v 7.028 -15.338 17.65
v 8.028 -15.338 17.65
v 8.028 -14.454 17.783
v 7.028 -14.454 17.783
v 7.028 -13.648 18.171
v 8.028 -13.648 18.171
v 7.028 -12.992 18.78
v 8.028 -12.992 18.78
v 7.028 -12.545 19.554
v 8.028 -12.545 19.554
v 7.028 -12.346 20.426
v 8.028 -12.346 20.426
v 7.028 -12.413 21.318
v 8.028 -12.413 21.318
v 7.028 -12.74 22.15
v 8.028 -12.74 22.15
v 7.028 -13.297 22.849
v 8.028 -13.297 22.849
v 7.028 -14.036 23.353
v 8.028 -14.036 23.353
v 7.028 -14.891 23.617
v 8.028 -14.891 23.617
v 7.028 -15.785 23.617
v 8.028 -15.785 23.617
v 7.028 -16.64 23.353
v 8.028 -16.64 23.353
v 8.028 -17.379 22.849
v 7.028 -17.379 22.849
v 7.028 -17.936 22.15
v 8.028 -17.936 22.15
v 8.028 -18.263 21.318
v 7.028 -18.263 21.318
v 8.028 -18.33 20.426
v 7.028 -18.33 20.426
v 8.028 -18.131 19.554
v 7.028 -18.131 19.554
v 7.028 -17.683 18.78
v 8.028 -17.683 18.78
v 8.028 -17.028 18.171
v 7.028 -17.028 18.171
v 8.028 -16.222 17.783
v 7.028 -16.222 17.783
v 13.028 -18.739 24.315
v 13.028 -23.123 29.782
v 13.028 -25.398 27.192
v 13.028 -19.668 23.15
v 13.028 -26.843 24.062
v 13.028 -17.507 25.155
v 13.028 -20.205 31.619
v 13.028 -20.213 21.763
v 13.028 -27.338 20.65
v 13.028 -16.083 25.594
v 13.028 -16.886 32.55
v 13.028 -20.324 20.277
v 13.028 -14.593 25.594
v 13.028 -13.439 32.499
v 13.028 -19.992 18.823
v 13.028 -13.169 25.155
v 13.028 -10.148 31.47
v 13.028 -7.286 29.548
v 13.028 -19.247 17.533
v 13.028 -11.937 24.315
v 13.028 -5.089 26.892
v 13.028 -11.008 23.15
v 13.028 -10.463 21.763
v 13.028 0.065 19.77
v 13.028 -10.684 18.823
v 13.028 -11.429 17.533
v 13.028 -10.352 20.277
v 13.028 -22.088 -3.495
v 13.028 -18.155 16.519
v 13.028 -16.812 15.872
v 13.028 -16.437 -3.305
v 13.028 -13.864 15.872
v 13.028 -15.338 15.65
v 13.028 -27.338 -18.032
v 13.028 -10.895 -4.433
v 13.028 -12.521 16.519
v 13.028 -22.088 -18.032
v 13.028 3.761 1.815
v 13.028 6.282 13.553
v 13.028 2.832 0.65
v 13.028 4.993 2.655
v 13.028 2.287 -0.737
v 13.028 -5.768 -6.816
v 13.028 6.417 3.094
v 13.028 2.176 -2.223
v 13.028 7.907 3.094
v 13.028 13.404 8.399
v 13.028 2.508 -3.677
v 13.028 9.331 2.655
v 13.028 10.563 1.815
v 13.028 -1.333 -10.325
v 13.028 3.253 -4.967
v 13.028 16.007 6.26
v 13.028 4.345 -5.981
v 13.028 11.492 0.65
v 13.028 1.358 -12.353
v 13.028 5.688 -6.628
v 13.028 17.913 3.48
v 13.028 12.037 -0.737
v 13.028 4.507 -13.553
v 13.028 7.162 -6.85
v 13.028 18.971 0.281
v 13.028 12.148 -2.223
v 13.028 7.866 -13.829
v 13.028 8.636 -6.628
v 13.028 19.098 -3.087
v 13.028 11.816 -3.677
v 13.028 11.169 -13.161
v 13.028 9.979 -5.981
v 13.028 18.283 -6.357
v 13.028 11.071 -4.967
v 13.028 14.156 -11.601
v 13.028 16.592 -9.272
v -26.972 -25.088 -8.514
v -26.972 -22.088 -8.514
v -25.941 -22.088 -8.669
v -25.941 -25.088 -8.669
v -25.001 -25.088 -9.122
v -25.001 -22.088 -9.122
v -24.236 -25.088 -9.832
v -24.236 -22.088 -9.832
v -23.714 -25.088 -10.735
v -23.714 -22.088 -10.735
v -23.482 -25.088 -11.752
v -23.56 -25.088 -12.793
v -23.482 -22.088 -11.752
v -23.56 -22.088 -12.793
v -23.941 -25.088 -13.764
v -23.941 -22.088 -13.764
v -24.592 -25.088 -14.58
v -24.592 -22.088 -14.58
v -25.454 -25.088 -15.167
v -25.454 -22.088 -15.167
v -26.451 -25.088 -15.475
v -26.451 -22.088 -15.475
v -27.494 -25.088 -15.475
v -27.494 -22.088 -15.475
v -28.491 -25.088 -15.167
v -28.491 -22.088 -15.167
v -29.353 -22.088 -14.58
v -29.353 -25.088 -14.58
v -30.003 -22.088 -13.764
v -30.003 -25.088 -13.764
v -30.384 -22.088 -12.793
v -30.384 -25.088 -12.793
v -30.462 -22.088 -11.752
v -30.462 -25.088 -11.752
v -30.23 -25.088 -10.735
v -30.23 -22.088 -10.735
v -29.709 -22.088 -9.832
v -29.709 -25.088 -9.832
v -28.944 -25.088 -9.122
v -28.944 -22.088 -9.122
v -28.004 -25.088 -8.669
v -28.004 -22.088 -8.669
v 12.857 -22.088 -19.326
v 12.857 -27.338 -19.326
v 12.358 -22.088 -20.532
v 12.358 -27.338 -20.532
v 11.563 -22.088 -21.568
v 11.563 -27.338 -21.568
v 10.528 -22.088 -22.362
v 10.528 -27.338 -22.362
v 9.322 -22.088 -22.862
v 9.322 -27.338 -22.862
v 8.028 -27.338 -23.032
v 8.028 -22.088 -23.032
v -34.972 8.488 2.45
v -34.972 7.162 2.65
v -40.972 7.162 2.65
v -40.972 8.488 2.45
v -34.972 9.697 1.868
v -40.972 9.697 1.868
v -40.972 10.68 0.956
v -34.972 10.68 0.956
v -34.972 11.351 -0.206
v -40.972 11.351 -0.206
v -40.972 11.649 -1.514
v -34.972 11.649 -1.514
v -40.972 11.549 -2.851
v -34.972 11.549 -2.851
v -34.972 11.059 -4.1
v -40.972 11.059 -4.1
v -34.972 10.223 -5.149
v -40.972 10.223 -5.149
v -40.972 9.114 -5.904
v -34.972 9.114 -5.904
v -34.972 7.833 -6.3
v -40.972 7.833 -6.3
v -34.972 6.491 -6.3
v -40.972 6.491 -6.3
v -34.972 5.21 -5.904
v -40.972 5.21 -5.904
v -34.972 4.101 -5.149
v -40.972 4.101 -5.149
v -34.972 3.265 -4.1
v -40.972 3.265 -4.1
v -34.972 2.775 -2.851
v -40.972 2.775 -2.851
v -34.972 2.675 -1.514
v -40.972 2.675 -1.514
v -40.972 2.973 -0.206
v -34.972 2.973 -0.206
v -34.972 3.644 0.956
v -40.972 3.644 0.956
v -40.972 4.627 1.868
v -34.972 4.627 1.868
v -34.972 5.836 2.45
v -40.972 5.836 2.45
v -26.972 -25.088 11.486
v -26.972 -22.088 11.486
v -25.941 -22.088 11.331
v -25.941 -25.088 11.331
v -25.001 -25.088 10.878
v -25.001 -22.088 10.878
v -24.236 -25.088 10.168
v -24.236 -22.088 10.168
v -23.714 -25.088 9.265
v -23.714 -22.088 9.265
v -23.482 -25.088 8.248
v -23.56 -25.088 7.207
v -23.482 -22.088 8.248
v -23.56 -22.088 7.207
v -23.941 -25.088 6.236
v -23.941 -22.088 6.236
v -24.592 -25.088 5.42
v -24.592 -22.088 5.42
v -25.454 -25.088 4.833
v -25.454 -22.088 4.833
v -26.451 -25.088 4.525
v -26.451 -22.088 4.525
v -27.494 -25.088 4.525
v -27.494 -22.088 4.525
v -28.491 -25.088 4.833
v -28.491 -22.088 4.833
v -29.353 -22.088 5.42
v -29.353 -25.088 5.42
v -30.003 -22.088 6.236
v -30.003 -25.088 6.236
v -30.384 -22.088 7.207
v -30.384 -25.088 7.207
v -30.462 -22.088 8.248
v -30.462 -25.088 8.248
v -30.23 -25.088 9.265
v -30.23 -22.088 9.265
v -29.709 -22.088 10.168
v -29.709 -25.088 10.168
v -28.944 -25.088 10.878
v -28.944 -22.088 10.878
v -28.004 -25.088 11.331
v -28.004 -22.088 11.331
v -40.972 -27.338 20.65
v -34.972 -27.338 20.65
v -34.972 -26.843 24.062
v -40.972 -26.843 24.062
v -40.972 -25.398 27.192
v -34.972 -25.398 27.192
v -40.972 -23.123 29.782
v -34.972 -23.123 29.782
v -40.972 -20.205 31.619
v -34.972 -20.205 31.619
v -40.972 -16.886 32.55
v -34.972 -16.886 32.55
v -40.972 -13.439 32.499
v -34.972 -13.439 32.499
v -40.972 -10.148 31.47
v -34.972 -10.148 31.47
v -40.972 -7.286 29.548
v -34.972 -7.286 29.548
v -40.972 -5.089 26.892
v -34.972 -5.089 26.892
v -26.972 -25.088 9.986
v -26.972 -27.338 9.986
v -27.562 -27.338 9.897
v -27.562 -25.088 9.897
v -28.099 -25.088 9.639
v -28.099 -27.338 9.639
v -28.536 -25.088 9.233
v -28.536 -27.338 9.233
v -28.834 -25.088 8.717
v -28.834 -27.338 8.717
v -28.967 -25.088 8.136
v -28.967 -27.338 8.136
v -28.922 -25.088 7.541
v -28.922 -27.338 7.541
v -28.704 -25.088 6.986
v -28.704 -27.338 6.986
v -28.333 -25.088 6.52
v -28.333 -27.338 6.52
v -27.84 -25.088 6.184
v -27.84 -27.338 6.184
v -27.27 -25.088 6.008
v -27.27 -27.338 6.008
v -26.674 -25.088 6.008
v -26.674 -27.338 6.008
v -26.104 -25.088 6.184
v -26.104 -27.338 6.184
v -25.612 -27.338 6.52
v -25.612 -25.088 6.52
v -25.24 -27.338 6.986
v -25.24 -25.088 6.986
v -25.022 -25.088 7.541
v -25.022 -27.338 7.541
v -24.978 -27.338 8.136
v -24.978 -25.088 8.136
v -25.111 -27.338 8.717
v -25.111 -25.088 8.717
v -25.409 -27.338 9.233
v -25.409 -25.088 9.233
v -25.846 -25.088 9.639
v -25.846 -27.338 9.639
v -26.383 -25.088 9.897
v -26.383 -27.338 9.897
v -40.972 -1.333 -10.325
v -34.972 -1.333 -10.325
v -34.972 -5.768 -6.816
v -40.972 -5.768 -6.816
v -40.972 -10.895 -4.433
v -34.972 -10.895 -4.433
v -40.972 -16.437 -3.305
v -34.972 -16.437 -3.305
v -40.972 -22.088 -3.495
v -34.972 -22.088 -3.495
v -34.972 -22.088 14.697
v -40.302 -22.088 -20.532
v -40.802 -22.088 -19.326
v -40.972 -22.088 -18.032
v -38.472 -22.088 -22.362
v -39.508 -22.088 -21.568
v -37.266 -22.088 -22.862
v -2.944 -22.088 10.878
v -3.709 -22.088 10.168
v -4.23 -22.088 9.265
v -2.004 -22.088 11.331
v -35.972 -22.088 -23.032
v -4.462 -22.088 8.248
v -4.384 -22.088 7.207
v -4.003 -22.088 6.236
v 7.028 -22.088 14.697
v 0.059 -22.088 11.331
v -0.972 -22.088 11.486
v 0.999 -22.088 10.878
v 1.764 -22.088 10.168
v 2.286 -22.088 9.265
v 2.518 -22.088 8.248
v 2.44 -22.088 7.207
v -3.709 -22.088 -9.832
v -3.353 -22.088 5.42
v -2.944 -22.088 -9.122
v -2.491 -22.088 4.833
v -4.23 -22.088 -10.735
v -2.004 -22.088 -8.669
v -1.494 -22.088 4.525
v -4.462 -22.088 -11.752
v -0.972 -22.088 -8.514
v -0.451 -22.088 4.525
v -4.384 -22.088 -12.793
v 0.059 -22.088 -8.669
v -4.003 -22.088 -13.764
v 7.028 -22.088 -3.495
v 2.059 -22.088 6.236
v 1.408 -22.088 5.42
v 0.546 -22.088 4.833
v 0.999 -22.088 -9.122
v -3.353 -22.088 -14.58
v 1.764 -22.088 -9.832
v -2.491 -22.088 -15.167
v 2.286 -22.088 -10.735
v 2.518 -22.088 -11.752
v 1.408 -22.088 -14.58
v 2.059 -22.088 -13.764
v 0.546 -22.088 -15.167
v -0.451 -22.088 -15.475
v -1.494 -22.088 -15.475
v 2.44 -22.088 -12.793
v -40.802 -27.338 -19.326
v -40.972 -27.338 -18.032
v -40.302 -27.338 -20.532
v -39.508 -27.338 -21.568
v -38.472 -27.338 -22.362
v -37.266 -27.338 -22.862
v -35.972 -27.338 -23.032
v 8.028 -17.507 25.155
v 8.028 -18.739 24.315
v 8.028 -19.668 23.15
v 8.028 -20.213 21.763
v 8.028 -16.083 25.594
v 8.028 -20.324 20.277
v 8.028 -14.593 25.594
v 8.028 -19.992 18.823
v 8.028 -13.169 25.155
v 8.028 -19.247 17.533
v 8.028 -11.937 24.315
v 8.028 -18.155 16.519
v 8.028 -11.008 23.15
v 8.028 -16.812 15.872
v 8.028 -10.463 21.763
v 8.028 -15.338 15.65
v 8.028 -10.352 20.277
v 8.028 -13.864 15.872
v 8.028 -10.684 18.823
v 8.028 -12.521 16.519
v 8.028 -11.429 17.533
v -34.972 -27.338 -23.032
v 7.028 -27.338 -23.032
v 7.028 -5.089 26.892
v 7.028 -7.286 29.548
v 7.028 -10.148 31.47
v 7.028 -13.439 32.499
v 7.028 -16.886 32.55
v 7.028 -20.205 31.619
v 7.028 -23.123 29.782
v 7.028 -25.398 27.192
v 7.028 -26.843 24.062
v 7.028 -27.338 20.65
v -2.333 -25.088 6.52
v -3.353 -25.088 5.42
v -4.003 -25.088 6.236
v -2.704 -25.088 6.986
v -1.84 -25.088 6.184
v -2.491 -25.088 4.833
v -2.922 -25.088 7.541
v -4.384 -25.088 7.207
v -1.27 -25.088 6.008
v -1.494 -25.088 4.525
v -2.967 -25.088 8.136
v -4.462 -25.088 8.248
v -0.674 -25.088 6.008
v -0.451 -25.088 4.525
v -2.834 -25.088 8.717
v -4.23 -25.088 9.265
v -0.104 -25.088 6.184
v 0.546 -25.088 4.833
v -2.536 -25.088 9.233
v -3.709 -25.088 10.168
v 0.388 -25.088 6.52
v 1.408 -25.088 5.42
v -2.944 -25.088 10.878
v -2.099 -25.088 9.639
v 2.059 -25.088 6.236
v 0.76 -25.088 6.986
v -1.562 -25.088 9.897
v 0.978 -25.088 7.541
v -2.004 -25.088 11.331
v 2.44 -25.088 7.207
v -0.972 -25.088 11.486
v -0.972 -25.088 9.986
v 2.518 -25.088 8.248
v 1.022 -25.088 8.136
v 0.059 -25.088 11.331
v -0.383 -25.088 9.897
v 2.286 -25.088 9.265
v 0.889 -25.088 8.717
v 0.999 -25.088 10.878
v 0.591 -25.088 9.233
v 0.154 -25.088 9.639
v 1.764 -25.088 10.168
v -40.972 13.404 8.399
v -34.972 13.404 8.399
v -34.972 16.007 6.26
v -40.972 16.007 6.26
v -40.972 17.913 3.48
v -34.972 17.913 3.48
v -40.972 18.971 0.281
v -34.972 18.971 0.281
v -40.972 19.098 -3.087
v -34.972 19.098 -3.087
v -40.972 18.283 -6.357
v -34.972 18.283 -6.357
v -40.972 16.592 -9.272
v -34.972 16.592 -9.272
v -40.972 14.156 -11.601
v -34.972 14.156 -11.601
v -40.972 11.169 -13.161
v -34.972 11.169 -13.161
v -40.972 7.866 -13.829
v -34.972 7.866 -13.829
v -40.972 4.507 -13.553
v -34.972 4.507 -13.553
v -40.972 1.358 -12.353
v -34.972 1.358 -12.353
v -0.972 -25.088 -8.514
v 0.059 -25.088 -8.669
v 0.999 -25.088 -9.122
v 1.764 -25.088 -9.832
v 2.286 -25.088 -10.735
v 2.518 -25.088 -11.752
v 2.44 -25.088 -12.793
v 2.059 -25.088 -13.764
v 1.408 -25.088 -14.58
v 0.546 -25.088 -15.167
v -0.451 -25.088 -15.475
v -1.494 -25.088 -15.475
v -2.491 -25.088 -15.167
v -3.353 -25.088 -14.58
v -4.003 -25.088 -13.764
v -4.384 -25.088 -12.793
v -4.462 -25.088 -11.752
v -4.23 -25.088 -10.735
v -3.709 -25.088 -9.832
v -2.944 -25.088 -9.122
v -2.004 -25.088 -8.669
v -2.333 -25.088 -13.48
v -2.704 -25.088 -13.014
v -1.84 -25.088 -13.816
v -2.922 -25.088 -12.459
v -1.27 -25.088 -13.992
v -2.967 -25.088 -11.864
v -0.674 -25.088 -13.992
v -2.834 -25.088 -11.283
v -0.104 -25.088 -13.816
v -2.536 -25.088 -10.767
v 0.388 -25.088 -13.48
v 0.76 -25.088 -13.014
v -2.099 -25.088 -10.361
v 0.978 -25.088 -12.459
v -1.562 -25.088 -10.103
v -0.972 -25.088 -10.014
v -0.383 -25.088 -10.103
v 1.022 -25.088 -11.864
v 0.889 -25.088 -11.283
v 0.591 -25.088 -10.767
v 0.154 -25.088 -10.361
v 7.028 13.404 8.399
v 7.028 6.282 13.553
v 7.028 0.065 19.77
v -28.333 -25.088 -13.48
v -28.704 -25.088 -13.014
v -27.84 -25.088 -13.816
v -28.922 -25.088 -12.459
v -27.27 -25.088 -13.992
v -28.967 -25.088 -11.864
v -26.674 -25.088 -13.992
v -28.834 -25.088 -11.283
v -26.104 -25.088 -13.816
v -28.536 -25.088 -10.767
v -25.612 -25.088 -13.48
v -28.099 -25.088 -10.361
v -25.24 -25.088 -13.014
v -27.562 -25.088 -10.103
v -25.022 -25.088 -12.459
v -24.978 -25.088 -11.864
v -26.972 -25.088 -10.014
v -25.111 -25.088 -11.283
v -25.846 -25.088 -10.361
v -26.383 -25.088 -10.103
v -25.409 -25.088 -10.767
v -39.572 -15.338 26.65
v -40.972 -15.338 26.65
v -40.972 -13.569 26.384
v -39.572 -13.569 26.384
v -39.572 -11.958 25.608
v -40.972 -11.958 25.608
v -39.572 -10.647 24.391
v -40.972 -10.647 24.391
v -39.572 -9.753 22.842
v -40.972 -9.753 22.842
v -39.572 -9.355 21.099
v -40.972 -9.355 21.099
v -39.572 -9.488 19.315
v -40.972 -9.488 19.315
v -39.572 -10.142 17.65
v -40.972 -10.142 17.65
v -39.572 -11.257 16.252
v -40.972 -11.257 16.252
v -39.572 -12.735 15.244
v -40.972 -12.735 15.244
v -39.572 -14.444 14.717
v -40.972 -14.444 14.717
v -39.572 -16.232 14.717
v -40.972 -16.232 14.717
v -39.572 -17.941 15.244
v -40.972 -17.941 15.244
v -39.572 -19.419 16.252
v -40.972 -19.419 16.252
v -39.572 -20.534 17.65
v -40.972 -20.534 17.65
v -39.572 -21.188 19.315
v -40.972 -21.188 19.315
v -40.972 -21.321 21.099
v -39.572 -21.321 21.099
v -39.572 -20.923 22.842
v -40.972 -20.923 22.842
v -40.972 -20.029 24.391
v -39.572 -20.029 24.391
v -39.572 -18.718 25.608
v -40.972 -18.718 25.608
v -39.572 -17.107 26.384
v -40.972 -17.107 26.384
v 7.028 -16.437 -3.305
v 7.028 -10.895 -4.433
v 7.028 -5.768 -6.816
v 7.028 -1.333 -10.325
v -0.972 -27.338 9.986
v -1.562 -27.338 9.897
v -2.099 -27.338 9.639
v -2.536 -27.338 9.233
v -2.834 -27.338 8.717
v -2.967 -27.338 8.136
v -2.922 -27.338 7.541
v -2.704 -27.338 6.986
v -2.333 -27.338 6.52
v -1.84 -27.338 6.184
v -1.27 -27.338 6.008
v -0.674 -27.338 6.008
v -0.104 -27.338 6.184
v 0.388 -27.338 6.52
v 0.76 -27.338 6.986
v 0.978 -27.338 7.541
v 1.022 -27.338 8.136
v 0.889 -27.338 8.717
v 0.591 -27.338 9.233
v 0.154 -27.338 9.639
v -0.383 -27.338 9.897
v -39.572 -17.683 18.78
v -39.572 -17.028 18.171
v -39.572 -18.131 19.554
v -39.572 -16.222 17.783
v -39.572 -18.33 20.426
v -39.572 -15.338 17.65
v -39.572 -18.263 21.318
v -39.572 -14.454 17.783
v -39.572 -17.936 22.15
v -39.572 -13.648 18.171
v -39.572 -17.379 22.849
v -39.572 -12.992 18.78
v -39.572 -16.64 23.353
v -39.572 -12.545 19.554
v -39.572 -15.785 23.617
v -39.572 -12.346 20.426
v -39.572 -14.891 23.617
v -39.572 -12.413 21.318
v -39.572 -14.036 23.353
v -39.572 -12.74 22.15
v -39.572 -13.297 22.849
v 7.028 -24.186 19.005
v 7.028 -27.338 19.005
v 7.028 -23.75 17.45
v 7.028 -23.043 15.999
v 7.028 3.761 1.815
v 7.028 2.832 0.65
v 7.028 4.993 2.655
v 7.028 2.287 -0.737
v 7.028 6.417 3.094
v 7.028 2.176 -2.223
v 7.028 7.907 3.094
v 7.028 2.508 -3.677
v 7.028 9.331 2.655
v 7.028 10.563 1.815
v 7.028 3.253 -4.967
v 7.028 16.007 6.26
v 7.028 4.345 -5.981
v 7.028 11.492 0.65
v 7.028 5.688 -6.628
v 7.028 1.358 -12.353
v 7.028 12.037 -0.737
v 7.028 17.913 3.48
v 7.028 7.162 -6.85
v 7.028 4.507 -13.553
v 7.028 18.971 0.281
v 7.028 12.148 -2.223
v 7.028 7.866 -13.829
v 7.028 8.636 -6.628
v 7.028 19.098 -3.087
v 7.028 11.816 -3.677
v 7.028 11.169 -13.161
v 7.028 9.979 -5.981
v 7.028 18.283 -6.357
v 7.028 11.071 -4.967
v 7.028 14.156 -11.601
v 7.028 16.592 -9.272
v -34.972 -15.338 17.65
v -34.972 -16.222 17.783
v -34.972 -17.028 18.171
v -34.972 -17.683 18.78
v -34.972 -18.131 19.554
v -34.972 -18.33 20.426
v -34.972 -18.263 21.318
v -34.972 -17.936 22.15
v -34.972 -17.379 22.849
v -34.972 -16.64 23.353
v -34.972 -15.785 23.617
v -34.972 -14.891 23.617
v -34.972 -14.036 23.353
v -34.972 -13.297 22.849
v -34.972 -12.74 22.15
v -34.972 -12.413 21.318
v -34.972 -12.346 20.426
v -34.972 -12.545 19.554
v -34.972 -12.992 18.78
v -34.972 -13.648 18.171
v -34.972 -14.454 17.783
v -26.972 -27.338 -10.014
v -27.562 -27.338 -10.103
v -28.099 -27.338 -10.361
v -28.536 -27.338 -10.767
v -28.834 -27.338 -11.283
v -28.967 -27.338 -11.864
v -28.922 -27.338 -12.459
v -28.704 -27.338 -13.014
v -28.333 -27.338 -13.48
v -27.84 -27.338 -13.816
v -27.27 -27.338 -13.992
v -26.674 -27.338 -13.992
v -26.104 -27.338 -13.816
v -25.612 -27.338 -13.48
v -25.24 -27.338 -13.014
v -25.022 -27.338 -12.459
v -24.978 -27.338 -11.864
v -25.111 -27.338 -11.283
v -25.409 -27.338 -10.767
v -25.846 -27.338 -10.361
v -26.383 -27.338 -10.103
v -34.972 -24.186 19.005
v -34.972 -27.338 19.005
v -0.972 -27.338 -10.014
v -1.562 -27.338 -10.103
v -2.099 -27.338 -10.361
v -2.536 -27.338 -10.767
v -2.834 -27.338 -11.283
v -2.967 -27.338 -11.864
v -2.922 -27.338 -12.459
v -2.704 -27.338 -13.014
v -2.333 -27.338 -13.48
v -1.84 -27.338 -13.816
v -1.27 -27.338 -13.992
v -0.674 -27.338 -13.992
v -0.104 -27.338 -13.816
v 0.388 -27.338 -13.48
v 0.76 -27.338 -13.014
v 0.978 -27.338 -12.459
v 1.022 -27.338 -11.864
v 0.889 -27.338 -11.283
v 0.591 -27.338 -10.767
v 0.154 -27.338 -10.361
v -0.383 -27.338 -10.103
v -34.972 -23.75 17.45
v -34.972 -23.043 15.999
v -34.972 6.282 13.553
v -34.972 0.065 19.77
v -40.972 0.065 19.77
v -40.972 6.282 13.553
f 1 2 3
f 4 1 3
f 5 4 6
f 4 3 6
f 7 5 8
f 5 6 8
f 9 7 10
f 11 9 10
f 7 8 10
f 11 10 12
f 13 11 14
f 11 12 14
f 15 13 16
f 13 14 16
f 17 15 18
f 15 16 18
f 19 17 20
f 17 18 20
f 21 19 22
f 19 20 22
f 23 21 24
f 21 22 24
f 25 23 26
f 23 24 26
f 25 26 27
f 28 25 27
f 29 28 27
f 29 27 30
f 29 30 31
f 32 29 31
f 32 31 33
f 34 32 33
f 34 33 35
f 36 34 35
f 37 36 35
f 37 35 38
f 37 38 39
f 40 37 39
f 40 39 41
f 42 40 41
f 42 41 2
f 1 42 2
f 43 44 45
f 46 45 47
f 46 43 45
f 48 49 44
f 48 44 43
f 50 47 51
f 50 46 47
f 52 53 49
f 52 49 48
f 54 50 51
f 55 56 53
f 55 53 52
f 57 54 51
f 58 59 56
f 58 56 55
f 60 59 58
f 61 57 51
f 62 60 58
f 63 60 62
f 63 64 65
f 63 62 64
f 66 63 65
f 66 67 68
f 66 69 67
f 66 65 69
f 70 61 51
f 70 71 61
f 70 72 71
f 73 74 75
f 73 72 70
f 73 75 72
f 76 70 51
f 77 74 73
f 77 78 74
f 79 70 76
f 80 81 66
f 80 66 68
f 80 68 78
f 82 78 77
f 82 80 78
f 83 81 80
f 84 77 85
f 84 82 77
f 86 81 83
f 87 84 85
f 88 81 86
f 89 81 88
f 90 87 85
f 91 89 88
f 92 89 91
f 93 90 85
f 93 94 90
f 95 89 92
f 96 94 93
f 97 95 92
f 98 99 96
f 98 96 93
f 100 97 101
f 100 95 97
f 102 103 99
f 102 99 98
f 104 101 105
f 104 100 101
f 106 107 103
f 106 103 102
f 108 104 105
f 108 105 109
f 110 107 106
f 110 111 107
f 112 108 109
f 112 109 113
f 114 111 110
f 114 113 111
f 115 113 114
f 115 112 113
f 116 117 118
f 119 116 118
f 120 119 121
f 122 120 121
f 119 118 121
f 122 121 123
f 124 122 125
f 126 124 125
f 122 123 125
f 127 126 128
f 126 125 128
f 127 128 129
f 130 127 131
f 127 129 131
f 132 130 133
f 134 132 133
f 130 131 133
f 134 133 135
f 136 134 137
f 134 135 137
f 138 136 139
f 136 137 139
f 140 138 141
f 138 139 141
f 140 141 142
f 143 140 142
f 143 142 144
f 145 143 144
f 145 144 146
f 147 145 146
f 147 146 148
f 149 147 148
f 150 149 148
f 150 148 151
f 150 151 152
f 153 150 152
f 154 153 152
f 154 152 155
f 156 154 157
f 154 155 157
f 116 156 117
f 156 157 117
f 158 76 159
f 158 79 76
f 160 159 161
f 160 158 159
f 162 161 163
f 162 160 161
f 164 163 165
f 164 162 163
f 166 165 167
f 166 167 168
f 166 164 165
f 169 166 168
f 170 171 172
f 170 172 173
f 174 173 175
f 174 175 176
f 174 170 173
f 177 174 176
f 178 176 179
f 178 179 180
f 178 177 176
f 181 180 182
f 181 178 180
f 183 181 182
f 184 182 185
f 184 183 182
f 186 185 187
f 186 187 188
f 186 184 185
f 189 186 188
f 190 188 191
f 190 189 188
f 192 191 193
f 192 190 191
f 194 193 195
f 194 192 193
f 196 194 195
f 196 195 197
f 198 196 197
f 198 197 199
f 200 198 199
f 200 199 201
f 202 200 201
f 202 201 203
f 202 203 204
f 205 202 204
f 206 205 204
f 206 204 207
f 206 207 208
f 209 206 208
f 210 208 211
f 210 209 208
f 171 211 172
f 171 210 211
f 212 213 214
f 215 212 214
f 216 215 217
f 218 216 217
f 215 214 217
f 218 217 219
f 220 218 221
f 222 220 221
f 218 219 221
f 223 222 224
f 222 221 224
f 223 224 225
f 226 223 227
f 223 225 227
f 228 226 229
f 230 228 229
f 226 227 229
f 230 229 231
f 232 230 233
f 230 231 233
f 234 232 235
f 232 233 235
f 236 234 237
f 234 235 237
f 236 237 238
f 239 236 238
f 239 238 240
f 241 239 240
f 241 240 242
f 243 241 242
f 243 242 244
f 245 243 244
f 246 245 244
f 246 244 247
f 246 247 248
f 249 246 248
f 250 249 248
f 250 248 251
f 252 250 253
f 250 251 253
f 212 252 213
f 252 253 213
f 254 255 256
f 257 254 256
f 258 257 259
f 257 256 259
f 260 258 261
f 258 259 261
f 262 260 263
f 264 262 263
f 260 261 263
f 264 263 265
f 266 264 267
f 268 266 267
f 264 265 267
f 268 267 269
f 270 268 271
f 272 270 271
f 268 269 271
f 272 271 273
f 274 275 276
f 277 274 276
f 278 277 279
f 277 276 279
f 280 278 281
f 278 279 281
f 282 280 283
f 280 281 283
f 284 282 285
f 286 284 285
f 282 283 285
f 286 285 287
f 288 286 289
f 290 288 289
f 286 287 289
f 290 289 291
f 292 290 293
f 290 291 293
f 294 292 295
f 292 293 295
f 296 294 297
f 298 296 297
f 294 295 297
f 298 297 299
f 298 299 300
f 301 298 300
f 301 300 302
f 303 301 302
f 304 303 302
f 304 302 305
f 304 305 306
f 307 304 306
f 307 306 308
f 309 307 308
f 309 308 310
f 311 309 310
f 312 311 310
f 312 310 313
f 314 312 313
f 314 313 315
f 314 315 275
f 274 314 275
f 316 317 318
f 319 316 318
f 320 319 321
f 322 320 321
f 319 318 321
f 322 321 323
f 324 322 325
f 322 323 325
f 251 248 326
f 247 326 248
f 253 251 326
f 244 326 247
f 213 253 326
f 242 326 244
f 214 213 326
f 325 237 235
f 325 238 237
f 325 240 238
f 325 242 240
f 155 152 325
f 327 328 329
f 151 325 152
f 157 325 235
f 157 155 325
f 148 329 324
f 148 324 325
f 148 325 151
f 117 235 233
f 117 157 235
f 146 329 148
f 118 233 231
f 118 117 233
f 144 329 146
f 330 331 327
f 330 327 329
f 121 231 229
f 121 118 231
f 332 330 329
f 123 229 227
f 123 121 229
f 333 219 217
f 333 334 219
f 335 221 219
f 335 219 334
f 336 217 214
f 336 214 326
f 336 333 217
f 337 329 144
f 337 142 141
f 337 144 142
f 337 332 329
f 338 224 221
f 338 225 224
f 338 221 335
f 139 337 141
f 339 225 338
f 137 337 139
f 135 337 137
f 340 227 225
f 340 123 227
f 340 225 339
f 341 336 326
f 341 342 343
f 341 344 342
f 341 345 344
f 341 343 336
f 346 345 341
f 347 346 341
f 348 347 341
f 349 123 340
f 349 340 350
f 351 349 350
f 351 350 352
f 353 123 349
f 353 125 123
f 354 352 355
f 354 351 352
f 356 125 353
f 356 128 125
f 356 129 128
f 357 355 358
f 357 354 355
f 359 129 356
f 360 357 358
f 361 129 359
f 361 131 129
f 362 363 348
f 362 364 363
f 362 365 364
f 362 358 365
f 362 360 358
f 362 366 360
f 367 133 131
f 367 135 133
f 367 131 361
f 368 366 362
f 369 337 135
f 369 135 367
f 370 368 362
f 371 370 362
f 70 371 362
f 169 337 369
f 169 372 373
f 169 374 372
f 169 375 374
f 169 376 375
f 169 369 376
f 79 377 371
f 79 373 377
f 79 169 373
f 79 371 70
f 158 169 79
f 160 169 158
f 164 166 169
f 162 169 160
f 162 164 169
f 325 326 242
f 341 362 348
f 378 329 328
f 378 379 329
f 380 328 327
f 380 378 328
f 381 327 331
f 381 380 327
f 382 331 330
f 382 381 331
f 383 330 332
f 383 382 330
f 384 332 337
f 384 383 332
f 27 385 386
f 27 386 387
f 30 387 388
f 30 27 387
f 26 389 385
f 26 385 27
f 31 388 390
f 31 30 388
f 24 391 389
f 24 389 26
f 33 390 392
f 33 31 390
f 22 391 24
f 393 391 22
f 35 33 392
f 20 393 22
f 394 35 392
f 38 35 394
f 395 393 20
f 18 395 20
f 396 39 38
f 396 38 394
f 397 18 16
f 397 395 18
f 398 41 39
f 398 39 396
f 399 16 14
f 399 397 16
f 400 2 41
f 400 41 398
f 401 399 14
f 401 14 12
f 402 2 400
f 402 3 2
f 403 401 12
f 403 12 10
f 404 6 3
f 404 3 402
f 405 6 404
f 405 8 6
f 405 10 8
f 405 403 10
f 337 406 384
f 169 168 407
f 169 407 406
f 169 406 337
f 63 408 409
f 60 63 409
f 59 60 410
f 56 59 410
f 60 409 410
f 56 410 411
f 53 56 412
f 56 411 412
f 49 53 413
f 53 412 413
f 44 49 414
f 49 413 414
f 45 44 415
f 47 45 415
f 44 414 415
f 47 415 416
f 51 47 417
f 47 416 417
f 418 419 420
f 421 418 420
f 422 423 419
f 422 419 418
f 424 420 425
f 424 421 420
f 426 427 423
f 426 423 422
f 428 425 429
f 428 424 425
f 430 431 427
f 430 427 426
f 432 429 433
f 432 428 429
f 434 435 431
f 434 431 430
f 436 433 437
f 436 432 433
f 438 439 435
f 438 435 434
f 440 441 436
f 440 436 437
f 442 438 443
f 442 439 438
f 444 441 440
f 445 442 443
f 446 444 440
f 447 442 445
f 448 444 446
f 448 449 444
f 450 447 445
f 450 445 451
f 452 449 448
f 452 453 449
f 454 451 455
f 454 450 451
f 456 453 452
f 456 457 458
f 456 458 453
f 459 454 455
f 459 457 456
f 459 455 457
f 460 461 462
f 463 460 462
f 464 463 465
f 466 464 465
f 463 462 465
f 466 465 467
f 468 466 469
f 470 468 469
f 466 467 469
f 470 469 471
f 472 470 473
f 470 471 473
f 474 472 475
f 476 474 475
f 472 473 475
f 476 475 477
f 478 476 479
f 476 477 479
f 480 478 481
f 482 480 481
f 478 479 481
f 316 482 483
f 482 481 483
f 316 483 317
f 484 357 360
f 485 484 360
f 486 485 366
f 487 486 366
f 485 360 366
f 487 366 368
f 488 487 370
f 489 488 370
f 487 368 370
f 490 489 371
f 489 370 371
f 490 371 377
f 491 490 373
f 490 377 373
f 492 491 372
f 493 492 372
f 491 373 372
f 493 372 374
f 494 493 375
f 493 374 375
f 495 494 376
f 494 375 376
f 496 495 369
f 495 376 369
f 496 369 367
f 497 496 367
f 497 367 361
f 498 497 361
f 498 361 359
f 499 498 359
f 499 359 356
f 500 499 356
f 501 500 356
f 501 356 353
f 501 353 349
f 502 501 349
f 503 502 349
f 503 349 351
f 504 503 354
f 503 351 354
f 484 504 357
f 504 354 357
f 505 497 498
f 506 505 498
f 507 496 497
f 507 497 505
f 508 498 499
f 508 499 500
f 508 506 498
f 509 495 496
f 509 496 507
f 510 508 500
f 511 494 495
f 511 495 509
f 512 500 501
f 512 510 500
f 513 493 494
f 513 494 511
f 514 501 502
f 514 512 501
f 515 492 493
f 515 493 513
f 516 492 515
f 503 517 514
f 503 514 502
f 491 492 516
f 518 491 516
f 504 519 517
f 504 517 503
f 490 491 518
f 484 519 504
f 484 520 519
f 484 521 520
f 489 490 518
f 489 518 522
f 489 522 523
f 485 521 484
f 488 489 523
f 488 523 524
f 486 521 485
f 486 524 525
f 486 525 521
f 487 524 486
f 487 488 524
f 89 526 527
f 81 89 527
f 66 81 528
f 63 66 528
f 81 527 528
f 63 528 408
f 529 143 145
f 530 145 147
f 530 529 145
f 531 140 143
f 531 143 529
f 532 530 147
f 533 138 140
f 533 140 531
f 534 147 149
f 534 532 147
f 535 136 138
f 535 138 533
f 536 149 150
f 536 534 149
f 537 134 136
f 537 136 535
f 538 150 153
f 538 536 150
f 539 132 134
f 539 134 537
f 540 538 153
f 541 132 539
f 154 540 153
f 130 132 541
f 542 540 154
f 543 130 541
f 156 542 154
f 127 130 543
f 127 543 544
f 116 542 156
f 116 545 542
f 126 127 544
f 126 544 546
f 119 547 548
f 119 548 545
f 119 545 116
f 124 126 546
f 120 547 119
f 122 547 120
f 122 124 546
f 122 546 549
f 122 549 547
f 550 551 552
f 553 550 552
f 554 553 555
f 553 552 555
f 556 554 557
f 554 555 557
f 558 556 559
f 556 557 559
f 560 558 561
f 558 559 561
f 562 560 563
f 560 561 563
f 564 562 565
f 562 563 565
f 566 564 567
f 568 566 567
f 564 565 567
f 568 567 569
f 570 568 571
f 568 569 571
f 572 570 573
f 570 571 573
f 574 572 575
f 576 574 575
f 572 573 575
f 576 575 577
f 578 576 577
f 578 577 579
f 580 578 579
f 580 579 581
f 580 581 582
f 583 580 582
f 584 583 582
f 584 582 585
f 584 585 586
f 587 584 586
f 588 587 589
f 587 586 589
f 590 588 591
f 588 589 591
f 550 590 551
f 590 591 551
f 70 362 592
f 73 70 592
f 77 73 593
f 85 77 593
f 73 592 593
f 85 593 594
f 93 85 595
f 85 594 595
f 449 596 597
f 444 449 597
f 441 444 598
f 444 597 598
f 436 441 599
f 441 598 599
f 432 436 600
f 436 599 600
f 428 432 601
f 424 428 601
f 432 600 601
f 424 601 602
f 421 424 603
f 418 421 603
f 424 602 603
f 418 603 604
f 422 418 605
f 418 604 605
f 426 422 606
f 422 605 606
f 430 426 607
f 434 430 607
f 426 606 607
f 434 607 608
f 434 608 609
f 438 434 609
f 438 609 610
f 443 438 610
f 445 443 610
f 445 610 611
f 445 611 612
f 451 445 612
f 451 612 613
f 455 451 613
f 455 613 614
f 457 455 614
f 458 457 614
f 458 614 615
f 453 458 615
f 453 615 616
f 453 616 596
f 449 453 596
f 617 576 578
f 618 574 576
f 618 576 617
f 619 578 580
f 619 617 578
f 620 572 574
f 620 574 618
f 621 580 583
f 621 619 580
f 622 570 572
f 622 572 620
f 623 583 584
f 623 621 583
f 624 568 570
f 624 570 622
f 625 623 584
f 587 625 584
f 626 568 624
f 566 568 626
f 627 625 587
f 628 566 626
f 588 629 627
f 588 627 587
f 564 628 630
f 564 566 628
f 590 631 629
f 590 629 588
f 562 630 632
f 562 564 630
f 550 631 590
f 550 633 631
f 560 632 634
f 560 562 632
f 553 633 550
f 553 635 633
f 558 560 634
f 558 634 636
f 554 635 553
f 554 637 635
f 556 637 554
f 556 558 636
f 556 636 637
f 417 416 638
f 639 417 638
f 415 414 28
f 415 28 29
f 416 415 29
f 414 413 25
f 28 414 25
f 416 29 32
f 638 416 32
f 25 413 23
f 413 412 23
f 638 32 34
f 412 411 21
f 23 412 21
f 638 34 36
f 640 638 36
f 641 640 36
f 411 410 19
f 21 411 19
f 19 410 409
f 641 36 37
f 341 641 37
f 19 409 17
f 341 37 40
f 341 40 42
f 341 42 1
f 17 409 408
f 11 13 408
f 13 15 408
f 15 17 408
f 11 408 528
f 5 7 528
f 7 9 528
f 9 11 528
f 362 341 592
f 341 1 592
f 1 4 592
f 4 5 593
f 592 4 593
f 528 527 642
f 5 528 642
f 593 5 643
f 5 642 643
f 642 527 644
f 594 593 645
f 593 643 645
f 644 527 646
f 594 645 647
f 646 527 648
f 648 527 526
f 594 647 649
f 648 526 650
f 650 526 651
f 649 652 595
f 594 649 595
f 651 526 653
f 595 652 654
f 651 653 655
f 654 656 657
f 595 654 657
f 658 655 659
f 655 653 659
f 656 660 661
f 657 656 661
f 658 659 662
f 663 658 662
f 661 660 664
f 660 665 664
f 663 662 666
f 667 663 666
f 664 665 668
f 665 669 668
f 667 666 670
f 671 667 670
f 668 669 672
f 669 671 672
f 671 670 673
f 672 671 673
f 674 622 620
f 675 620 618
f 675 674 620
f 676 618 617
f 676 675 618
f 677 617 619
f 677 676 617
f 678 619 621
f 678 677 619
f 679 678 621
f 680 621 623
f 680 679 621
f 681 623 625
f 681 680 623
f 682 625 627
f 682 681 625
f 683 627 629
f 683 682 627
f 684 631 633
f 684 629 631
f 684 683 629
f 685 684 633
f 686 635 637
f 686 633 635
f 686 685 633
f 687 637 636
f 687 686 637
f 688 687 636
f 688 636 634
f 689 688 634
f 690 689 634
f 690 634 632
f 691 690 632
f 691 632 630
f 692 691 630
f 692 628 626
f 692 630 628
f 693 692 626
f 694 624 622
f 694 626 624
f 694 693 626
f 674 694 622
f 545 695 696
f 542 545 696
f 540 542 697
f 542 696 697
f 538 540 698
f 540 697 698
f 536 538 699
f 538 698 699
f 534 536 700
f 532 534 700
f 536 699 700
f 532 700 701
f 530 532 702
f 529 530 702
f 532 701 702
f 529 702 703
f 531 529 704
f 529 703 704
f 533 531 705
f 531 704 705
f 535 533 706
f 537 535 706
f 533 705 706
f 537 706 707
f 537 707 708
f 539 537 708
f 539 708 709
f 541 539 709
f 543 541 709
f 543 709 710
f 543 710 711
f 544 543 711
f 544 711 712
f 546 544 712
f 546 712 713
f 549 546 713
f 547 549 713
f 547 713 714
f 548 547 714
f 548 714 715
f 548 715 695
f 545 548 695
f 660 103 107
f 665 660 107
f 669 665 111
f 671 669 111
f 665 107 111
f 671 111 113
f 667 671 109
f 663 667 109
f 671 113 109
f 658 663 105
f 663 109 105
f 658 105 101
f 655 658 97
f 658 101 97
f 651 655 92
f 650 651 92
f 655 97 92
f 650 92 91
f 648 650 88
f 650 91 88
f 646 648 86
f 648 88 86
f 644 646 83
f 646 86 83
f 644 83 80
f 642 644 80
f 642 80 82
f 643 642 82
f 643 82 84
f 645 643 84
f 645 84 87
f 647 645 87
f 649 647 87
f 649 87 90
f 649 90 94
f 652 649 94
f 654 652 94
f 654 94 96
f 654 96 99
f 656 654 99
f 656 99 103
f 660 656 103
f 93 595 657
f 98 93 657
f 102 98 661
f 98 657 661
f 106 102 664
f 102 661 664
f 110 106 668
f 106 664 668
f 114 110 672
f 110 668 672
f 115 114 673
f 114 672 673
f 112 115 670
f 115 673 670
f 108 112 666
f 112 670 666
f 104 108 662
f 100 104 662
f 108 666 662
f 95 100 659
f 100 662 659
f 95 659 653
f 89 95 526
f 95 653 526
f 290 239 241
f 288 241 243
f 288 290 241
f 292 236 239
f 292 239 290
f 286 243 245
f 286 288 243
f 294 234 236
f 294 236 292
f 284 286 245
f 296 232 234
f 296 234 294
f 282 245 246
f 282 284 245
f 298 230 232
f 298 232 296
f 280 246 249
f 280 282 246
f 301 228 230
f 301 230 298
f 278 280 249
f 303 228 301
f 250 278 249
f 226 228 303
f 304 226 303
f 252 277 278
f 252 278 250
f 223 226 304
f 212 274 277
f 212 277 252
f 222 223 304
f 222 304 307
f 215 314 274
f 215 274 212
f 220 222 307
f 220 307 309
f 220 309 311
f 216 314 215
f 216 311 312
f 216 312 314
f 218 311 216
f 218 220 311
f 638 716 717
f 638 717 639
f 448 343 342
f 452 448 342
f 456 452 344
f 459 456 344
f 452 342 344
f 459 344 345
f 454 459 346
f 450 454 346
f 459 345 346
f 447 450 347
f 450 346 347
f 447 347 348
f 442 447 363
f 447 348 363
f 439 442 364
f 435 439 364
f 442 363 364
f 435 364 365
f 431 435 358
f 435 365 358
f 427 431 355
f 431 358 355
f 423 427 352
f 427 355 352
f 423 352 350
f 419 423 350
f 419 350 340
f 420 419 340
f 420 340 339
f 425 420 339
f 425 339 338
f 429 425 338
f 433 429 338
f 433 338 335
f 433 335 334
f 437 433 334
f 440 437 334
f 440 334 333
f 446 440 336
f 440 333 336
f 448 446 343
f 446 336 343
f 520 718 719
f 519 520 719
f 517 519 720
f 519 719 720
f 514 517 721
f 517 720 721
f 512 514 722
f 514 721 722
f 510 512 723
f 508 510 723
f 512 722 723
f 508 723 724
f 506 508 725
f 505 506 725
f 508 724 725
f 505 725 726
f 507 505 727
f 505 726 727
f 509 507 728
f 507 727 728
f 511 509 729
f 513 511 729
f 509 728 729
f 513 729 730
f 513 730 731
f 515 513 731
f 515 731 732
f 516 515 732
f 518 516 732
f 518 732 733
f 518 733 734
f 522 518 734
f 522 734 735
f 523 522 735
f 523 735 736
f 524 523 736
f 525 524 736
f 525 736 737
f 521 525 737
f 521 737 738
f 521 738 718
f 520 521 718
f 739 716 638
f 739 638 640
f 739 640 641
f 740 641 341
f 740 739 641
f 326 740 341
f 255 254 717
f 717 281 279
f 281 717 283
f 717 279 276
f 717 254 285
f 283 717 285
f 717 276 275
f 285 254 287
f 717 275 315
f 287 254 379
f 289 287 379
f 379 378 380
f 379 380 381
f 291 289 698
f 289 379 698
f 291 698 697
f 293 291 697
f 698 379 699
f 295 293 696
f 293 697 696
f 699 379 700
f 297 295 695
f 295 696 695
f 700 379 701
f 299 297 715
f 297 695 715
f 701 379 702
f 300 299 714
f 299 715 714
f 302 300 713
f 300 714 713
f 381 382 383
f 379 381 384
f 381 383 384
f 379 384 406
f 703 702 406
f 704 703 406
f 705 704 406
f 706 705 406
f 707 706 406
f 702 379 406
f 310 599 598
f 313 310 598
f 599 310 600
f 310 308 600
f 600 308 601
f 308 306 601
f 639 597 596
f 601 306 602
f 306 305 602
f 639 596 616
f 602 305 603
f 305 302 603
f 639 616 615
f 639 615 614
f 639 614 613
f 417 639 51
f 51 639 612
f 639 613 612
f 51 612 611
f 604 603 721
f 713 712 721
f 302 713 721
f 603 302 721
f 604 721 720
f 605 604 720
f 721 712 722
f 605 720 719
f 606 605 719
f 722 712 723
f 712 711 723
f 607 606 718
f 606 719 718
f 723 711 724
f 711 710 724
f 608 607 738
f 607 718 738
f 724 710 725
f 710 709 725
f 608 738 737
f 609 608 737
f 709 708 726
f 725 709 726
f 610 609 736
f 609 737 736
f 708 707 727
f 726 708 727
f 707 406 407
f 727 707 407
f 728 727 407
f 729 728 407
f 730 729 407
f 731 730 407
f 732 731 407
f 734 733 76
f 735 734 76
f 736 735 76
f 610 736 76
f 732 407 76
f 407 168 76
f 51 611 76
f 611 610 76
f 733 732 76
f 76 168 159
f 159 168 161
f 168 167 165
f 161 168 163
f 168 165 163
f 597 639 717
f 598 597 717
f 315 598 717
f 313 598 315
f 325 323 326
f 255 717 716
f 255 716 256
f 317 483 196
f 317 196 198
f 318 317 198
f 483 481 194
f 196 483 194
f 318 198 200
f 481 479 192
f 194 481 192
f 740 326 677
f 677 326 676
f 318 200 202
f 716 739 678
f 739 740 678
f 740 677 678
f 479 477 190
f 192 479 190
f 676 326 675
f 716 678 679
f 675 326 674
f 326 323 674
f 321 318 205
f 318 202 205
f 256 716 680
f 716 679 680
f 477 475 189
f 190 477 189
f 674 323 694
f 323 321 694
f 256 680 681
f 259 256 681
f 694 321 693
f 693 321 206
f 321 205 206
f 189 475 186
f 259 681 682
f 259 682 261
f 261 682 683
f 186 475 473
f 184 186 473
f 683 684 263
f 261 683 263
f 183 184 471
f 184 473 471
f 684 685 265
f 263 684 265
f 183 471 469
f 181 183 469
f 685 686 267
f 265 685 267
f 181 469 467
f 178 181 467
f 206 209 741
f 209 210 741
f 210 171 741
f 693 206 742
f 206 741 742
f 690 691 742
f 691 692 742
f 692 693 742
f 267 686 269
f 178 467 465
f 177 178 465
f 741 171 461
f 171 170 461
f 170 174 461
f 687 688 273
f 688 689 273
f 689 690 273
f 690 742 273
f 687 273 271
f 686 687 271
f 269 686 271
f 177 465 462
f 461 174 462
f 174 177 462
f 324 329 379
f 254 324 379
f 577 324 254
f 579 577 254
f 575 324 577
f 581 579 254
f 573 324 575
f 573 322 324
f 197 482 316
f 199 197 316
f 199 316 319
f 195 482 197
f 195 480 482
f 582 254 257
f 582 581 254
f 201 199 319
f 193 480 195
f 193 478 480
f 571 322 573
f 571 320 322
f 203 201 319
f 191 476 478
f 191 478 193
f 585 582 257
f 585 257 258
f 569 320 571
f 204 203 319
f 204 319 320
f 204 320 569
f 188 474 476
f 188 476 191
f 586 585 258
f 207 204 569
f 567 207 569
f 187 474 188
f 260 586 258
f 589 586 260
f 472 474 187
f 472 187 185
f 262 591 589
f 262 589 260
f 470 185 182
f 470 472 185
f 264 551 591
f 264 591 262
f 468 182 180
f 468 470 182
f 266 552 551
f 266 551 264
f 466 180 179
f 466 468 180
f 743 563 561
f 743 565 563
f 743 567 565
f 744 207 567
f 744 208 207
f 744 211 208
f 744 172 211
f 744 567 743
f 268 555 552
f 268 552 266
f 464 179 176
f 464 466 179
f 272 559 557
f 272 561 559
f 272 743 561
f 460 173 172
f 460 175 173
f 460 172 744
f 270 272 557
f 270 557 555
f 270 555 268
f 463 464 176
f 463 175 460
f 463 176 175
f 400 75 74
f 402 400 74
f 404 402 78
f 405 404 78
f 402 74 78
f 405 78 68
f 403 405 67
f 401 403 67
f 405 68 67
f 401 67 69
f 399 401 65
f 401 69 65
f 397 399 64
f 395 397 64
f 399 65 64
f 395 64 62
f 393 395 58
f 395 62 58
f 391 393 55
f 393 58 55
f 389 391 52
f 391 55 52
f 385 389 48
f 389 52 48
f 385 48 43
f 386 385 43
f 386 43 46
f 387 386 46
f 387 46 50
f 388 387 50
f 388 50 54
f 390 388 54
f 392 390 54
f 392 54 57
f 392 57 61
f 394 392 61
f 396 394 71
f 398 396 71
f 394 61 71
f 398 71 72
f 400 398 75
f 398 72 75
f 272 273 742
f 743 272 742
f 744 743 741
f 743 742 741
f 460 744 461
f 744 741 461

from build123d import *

# Parameters (mm, degrees)
SKETCH_1_R                      = 8
EXTRUDE_1_DEPTH                 = 4
SKETCH_7_R                      = 3.333333333
CUT_EXTRUDE_3_DEPTH             = 33.771939216
SKETCH_8_R                      = 2
CUT_EXTRUDE_4_DEPTH             = 33.771939216
EXTRUDE_START                   = 28
SKETCH_9_R                      = 3
SKETCH_9_R_2                    = 2
EXTRUDE_2_DEPTH                 = 4
EXTRUDE_3_REACH                 = 47.629
SKETCH_10_W                     = 13.024468831
SKETCH_10_H                     = 3.5
SKETCH_11_W                     = 28
SKETCH_11_H                     = 3.5
EXTRUDE_4_DEPTH                 = 15
SCALE_1_SCALE                   = 1.5
CUT_EXTRUDE_5_DEPTH             = 42
SKETCH_17_R                     = 6
CUT_EXTRUDE_6_DEPTH             = 1.4
SKETCH_18_R                     = 5
CUT_EXTRUDE_7_DEPTH             = 5
CUT_EXTRUDE_8_REACH             = 72.05
SKETCH_19_R                     = 2
CUT_EXTRUDE_8_DIRECTION_2_DEPTH = 71.050046232
FILLET_1_R                      = 5
SKETCH_21_R                     = 3.5
CUT_EXTRUDE_9_DEPTH             = 3


with BuildPart() as part:
    # 草图1 → 凸台-拉伸1 (new body)
    with BuildSketch(Plane(origin=(0, 0, 0), x_dir=(0, 0, -1), z_dir=(1, 0, 0))):
        with BuildLine():
            ThreePointArc((-7, -15), (-9.343145751, -20.656854249), (-15, -23))
            Line((-15, -23), (14.121578143, -23))
            Line((14.121578143, -23), (14.121578143, -19.5))
            Line((14.121578143, -19.5), (1.097109312, -19.5))
            ThreePointArc((1.097109312, -19.5), (1.721982831, -12.038332525), (5.650082252, -5.66361815))
            ThreePointArc((5.650082252, -5.66361815), (-4.947792662, -6.286441583), (-6.832692698, 4.161046803))
            ThreePointArc((-6.832692698, 4.161046803), (-12.258618637, -2.741381363), (-19.161046803, -8.167307302))
            ThreePointArc((-19.161046803, -8.167307302), (-11.081350642, -8.025461506), (-7, -15))
        make_face()
        with Locations((-15, -15)):
            Circle(SKETCH_1_R)
        Circle(SKETCH_1_R)
    extrude(amount=EXTRUDE_1_DEPTH)

    # 草图7 → 切除-拉伸3 (cut, through all)
    with BuildSketch(Plane(origin=(4, 0, 0), x_dir=(0, 0, -1), z_dir=(1, 0, 0))):
        Circle(SKETCH_7_R)
    extrude(amount=-CUT_EXTRUDE_3_DEPTH, mode=Mode.SUBTRACT)

    # 草图8 → 切除-拉伸4 (cut, through all)
    with BuildSketch(Plane(origin=(4, 0, 0), x_dir=(0, 0, -1), z_dir=(1, 0, 0))):
        with Locations((-15, -15)):
            Circle(SKETCH_8_R)
    extrude(amount=-CUT_EXTRUDE_4_DEPTH, mode=Mode.SUBTRACT)


with BuildPart() as body_2:
    # 草图9 → 凸台-拉伸2 (new body)
    with BuildSketch(Plane.ZY.offset(EXTRUDE_START)):
        with BuildLine():
            Line((-1.097109312, -19.5), (-14.121578143, -19.5))
            Line((-14.121578143, -19.5), (-14.121578143, -23))
            Line((-14.121578143, -23), (15, -23))
            ThreePointArc((15, -23), (22.702646999, -17.160839931), (19.161046803, -8.167307302))
            ThreePointArc((19.161046803, -8.167307302), (12.258618637, -2.741381363), (6.832692698, 4.161046803))
            ThreePointArc((6.832692698, 4.161046803), (-4.947792662, 6.286441583), (-5.650082252, -5.66361815))
            ThreePointArc((-5.650082252, -5.66361815), (-1.721982831, -12.038332525), (-1.097109312, -19.5))
        make_face()
        Circle(SKETCH_9_R, mode=Mode.SUBTRACT)
        with Locations(Location((15, -15, 0), (0, 0, 180))):
            Circle(SKETCH_9_R_2, mode=Mode.SUBTRACT)
    extrude(amount=EXTRUDE_2_DEPTH)

    # 草图10 → 凸台-拉伸3 (add, up to next)
    with BuildSketch(Plane.ZY, mode=Mode.PRIVATE) as extrude_3_sk1:
        with Locations((-7.609343728, -21.25)):
            Rectangle(SKETCH_10_W, SKETCH_10_H)
    extrude_3_tool1 = extrude(extrude_3_sk1.sketch, amount=EXTRUDE_3_REACH, mode=Mode.PRIVATE) - body_2.part

    add(part.part)  # 凸台-拉伸3 merges part
    add(extrude_3_tool1.solids().sort_by_distance((0, -21.25, -7.609344))[0])

    # 草图11 → 凸台-拉伸4 (add)
    with BuildSketch(Plane.XY.offset(-1.097109312)):
        with Locations((-14, -21.25)):
            Rectangle(SKETCH_11_W, SKETCH_11_H)
    extrude(amount=EXTRUDE_4_DEPTH)


with BuildPart() as body_2_1:
    # 缩放比例1: scaled about (-14.05550312, -14.324036163, 3.699652839)
    add(body_2.part.scale(SCALE_1_SCALE).moved(Location((7.02775156, 7.162018082, -1.84982642))))

    # 草图13 → 切除-拉伸5 (cut)
    with BuildSketch(Plane(origin=(-34.97224844, 0, 0), x_dir=(0, 0, -1), z_dir=(1, 0, 0))):
        with BuildLine():
            Line((-14.697233131, -22.087981919), (-19.004509613, -22.087981919))
            Line((-19.004509613, -22.087981919), (-19.004509613, -24.186246726))
            ThreePointArc((-19.004509613, -24.186246726), (-16.708679438, -23.42900311), (-14.697233131, -22.087981919))
        make_face()
    extrude(amount=CUT_EXTRUDE_5_DEPTH, mode=Mode.SUBTRACT)

    # 草图17 → 切除-拉伸6 (cut)
    with BuildSketch(Plane.ZY.offset(40.97224844)):
        with Locations((20.650173581, -15.337981919)):
            Circle(SKETCH_17_R)
    extrude(amount=-CUT_EXTRUDE_6_DEPTH, mode=Mode.SUBTRACT)

    # 草图18 → 切除-拉伸7 (cut)
    with BuildSketch(Plane(origin=(13.02775156, 0, 0), x_dir=(0, 0, -1), z_dir=(1, 0, 0))):
        with Locations((-20.650173581, -15.337981919)):
            Circle(SKETCH_18_R)
    extrude(amount=-CUT_EXTRUDE_7_DEPTH, mode=Mode.SUBTRACT)

    # 草图19 → 切除-拉伸8 (cut, up to next)
    with BuildSketch(Plane.XZ.offset(27.337981919), mode=Mode.PRIVATE) as cut_extrude_8_sk1:
        with Locations(Location((-0.97224844, -12.01384201, 0), (0, 0, 90))):
            Circle(SKETCH_19_R)
    cut_extrude_8_tool1 = extrude(cut_extrude_8_sk1.sketch, amount=-CUT_EXTRUDE_8_REACH, mode=Mode.PRIVATE) & body_2_1.part
    # 草图19 → 切除-拉伸8 (cut, up to next)
    with BuildSketch(Plane.XZ.offset(27.337981919), mode=Mode.PRIVATE) as cut_extrude_8_sk2:
        with Locations(Location((-26.97224844, -12.01384201, 0), (0, 0, 90))):
            Circle(SKETCH_19_R)
    cut_extrude_8_tool2 = extrude(cut_extrude_8_sk2.sketch, amount=-CUT_EXTRUDE_8_REACH, mode=Mode.PRIVATE) & body_2_1.part
    # 草图19 → 切除-拉伸8 (cut, up to next)
    with BuildSketch(Plane.XZ.offset(27.337981919), mode=Mode.PRIVATE) as cut_extrude_8_sk3:
        with Locations(Location((-26.97224844, 7.98615799, 0), (0, 0, 90))):
            Circle(SKETCH_19_R)
    cut_extrude_8_tool3 = extrude(cut_extrude_8_sk3.sketch, amount=-CUT_EXTRUDE_8_REACH, mode=Mode.PRIVATE) & body_2_1.part
    # 草图19 → 切除-拉伸8 (cut, up to next)
    with BuildSketch(Plane.XZ.offset(27.337981919), mode=Mode.PRIVATE) as cut_extrude_8_sk4:
        with Locations(Location((-0.97224844, 7.98615799, 0), (0, 0, 90))):
            Circle(SKETCH_19_R)
    cut_extrude_8_tool4 = extrude(cut_extrude_8_sk4.sketch, amount=-CUT_EXTRUDE_8_REACH, mode=Mode.PRIVATE) & body_2_1.part
    add(cut_extrude_8_tool1.solids().sort_by_distance((-0.972248, -27.337982, -12.013842))[0], mode=Mode.SUBTRACT)
    add(cut_extrude_8_tool2.solids().sort_by_distance((-26.972248, -27.337982, -12.013842))[0], mode=Mode.SUBTRACT)
    add(cut_extrude_8_tool3.solids().sort_by_distance((-26.972248, -27.337982, 7.986158))[0], mode=Mode.SUBTRACT)
    add(cut_extrude_8_tool4.solids().sort_by_distance((-0.972248, -27.337982, 7.986158))[0], mode=Mode.SUBTRACT)

    # 草图19 → 切除-拉伸8 direction 2 (cut)
    with BuildSketch(Plane.XZ.offset(27.337981919)):
        with Locations(Location((-0.97224844, -12.01384201, 0), (0, 0, 90))):
            Circle(SKETCH_19_R)
        with Locations(Location((-26.97224844, -12.01384201, 0), (0, 0, 90))):
            Circle(SKETCH_19_R)
        with Locations(Location((-26.97224844, 7.98615799, 0), (0, 0, 90))):
            Circle(SKETCH_19_R)
        with Locations(Location((-0.97224844, 7.98615799, 0), (0, 0, 90))):
            Circle(SKETCH_19_R)
    extrude(amount=CUT_EXTRUDE_8_DIRECTION_2_DEPTH, mode=Mode.SUBTRACT)

    # 圆角1
    fillet_1_edges = [body_2_1.edges().sort_by_distance(p)[0] for p in [
        (13.02775156, -24.712981919, -23.032193634),
        (-40.97224844, -24.712981919, -23.032193634),
    ]]
    fillet(fillet_1_edges, radius=FILLET_1_R)

    # 草图21 → 切除-拉伸9 (cut)
    with BuildSketch(Plane(origin=(0, -22.087981919, 0), x_dir=(1, 0, 0), z_dir=(0, 1, 0))):
        with Locations(Location((-26.97224844, 12.01384201, 0), (0, 0, 270))):
            Circle(SKETCH_21_R)
        with Locations(Location((-0.97224844, 12.01384201, 0), (0, 0, 270))):
            Circle(SKETCH_21_R)
        with Locations(Location((-0.97224844, -7.98615799, 0), (0, 0, 270))):
            Circle(SKETCH_21_R)
        with Locations(Location((-26.97224844, -7.98615799, 0), (0, 0, 270))):
            Circle(SKETCH_21_R)
    extrude(amount=-CUT_EXTRUDE_9_DEPTH, mode=Mode.SUBTRACT)


solid = body_2_1.part
